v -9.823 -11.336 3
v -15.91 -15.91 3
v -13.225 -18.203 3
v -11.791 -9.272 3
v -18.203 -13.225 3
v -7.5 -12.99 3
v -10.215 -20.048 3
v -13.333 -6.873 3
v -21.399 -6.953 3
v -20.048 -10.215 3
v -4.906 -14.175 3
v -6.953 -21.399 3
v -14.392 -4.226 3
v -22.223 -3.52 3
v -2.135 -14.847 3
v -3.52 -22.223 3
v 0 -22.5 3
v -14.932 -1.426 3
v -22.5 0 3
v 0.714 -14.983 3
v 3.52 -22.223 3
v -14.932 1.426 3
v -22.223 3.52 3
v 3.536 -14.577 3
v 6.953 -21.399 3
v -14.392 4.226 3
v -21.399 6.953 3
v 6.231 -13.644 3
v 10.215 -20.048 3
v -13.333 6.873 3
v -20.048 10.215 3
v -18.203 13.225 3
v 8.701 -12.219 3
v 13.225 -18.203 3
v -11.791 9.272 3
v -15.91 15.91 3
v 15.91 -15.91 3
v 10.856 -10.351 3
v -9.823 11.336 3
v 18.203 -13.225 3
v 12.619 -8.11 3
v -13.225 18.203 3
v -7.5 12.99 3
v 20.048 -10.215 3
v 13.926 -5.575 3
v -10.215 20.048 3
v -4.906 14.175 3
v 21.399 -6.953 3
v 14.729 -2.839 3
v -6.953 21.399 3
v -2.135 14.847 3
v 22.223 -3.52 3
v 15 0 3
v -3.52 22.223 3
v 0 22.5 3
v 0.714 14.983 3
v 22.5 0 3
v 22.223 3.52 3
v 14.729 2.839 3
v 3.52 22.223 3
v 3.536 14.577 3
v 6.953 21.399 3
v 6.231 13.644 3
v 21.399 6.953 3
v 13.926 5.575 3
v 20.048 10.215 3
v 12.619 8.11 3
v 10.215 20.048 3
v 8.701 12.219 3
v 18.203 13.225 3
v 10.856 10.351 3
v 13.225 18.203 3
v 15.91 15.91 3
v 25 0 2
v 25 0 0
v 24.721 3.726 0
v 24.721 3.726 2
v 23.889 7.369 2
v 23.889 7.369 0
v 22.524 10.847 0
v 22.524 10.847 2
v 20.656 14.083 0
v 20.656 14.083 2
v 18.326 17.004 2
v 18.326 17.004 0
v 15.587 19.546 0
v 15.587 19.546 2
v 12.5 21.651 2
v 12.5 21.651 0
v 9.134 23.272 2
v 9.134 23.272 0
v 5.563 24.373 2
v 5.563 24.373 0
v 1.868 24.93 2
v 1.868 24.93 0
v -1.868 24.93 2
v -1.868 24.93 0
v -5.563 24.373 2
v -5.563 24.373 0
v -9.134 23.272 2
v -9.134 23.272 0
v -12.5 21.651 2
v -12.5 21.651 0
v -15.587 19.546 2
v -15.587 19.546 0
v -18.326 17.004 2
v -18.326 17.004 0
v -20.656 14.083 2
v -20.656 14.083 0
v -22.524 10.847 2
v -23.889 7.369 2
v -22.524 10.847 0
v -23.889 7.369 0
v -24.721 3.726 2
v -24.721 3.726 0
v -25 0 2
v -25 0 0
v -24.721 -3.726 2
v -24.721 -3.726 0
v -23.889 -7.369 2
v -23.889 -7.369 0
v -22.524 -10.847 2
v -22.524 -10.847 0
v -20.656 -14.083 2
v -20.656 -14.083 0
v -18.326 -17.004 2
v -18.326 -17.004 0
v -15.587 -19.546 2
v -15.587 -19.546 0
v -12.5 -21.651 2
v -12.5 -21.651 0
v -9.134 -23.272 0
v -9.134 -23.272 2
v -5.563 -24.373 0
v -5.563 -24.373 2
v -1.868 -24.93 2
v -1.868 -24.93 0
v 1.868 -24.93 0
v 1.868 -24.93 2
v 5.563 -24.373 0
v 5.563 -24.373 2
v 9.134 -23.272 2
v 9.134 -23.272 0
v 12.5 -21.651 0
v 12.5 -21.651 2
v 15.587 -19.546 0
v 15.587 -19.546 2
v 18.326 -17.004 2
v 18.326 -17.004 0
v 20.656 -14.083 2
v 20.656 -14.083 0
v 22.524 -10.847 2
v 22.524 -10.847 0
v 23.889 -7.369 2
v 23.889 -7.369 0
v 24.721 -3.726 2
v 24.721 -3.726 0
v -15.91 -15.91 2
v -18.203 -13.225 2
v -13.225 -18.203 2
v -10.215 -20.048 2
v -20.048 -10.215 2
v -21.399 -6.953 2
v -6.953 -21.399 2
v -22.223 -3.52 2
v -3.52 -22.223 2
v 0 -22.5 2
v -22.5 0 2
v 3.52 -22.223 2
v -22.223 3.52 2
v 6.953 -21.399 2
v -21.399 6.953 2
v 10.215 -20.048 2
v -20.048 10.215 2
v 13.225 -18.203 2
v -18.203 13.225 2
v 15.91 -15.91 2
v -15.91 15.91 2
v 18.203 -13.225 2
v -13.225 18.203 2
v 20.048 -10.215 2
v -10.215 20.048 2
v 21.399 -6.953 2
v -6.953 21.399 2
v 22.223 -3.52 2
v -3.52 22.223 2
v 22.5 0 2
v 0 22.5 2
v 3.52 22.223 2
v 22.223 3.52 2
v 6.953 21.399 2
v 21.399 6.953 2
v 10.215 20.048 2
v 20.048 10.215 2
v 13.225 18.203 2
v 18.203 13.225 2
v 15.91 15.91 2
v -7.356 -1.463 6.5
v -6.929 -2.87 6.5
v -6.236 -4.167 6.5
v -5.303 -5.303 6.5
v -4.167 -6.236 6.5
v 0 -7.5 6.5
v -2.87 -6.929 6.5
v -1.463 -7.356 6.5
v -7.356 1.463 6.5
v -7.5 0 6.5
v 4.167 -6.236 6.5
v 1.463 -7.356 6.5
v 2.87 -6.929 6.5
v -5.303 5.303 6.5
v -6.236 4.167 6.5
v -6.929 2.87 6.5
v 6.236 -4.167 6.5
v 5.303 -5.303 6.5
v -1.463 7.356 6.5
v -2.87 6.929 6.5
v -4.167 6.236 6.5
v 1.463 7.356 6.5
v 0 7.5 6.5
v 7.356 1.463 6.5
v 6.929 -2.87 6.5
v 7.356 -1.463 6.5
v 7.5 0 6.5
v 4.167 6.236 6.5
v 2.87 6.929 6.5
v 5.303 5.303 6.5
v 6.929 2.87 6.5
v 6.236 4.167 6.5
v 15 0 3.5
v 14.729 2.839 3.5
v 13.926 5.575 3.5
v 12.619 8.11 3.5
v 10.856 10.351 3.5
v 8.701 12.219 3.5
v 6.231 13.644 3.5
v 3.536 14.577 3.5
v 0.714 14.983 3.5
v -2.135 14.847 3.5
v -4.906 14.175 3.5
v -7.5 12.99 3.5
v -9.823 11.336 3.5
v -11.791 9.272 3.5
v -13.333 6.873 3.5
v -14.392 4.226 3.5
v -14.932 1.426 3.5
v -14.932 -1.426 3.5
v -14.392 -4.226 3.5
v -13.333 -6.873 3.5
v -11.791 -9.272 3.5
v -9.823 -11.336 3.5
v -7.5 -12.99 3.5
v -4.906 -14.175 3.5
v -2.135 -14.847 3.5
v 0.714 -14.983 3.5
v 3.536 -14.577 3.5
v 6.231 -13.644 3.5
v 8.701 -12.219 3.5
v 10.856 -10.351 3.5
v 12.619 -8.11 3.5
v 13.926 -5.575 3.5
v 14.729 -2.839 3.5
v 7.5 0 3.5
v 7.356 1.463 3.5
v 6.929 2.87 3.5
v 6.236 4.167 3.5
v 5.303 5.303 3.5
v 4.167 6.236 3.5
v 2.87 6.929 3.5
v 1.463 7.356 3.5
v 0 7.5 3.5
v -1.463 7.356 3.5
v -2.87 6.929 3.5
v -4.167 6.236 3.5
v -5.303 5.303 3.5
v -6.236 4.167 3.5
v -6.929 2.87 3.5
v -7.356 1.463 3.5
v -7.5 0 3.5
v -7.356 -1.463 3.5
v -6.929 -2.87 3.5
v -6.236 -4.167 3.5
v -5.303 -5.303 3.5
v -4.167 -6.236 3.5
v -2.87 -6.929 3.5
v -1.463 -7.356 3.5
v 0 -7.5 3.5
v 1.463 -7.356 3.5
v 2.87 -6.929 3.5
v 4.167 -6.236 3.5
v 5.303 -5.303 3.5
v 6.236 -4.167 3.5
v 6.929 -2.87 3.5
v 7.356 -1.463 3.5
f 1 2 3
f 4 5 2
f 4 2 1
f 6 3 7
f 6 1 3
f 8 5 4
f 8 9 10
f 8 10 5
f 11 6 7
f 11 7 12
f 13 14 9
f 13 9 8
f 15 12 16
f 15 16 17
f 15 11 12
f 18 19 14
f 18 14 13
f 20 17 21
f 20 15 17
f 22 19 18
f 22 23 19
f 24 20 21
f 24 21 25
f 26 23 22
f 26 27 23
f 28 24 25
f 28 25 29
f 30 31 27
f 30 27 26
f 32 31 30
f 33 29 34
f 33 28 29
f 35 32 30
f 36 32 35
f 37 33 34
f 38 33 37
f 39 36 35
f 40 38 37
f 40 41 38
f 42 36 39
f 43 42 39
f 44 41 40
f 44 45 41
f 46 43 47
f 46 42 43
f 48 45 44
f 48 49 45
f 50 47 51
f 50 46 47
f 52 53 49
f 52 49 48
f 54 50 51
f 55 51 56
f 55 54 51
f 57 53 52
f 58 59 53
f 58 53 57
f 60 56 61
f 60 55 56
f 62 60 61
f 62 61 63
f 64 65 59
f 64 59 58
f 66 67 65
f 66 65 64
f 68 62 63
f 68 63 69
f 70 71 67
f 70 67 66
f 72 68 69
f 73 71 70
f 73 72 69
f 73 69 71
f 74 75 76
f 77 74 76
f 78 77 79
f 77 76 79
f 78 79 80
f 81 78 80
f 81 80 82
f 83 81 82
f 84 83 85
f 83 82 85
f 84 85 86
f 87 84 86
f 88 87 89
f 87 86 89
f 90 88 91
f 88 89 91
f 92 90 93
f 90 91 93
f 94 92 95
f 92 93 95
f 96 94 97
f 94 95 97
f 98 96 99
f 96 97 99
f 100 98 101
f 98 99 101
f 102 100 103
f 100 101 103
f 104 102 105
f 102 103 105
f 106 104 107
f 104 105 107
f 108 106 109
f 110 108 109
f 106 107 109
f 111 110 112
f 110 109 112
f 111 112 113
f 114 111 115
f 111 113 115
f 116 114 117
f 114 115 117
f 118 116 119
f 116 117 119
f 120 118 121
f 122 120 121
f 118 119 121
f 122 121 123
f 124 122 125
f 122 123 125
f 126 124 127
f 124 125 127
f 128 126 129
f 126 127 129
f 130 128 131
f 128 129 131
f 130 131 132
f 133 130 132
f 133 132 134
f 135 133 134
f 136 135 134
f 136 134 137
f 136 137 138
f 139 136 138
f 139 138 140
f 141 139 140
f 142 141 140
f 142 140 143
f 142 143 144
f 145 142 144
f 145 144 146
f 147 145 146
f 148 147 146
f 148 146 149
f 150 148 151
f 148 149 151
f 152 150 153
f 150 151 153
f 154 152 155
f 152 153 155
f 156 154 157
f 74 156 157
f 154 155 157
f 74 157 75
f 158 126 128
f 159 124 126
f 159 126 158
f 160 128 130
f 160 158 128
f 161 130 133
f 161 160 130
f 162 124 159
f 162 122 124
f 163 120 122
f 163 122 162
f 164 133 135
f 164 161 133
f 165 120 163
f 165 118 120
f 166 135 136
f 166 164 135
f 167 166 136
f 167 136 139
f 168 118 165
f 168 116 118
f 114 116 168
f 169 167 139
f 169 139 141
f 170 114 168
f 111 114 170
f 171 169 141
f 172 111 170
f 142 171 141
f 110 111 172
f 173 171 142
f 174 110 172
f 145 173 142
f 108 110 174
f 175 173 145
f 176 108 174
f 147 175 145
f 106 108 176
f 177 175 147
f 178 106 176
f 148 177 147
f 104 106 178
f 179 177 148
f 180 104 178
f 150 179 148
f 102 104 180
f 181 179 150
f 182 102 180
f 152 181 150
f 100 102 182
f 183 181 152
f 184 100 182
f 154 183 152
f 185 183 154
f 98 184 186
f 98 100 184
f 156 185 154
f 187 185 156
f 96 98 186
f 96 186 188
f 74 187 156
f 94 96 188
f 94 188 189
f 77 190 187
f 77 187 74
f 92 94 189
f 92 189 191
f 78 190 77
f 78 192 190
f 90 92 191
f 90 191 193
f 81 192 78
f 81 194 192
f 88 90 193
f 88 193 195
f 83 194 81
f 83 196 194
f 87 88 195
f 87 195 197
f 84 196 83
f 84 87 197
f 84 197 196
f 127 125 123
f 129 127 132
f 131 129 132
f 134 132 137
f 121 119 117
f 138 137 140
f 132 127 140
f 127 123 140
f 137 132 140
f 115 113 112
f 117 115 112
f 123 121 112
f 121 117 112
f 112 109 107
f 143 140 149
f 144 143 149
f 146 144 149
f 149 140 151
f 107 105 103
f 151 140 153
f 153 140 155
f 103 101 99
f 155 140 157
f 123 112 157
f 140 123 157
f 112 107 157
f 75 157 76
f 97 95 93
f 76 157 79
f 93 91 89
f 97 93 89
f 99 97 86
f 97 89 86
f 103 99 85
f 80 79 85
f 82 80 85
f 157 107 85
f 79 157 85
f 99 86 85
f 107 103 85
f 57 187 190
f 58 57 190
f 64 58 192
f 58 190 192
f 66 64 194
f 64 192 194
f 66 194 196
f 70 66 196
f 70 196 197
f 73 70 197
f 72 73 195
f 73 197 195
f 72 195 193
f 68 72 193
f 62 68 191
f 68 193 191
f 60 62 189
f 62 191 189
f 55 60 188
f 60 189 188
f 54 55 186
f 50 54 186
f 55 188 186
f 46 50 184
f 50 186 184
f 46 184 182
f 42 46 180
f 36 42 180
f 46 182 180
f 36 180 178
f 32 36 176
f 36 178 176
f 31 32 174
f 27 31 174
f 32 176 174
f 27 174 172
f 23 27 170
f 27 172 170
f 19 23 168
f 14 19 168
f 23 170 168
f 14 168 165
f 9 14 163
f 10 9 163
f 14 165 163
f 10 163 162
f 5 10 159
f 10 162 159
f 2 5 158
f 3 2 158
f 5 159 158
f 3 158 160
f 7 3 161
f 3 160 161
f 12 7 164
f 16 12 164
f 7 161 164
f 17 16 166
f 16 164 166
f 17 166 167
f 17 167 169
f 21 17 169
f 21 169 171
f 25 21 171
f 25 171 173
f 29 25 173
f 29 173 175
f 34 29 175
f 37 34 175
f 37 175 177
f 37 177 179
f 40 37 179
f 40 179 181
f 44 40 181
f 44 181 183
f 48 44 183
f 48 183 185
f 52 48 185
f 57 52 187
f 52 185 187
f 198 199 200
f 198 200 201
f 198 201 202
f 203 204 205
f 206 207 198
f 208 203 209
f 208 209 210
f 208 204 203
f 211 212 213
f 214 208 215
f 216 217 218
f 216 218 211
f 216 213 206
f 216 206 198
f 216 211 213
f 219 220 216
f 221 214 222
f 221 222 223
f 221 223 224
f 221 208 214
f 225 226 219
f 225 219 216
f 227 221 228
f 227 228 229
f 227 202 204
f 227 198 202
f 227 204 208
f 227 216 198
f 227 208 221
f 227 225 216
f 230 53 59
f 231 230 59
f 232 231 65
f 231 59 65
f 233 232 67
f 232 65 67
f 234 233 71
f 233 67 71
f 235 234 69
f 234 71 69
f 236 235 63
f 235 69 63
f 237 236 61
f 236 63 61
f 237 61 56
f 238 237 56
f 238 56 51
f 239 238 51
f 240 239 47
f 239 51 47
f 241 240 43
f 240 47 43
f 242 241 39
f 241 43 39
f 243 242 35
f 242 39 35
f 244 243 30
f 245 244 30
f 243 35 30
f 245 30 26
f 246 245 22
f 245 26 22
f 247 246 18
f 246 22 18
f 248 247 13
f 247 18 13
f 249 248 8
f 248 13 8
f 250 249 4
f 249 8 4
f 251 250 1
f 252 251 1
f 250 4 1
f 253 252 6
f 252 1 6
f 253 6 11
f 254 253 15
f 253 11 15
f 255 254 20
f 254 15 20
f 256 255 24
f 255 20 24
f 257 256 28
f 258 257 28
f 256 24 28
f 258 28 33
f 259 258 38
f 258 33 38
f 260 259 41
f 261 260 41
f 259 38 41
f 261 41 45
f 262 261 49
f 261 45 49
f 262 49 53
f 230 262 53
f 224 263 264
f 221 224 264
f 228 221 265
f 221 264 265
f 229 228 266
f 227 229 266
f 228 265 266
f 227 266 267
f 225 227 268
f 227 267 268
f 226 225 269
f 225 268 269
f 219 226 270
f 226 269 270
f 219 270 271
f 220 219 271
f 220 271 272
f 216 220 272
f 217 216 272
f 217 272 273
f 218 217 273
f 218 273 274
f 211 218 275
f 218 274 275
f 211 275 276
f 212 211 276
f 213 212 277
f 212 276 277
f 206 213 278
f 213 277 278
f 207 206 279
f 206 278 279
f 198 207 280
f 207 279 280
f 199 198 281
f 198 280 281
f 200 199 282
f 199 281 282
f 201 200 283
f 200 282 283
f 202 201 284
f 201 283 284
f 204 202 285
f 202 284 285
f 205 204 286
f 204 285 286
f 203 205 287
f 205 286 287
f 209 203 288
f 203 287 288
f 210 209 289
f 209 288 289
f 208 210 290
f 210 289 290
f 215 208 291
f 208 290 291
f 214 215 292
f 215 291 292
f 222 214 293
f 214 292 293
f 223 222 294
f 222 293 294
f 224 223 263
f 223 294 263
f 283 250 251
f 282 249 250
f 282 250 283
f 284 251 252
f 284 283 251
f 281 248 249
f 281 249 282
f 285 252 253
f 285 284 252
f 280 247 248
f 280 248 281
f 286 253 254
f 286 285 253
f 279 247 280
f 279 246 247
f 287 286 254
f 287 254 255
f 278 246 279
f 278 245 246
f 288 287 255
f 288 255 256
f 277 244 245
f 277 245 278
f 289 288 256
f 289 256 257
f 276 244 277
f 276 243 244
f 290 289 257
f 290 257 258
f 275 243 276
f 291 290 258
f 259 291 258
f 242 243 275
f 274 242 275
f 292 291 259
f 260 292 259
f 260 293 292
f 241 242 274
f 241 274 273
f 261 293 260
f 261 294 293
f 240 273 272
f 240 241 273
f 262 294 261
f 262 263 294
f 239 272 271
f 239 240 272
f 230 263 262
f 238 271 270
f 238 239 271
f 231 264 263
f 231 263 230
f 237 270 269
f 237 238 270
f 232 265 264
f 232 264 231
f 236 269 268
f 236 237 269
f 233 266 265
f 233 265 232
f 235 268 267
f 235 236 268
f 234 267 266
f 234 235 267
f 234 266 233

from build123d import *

# Parameters (mm, degrees)
SKETCH1_R           = 25
SKETCH1_R_2         = 22.5
SKETCH1_R_3         = 15
SKETCH1_R_4         = 7.5
BOSS_EXTRUDE1_DEPTH = 2
BOSS_EXTRUDE2_START = 2
SKETCH1_3_R         = 22.5
SKETCH1_3_R_2       = 15
SKETCH1_3_R_3       = 7.5
BOSS_EXTRUDE2_DEPTH = 1
BOSS_EXTRUDE3_START = 3
SKETCH1_4_R         = 15
SKETCH1_4_R_2       = 7.5
BOSS_EXTRUDE3_DEPTH = 0.5
BOSS_EXTRUDE4_START = 3.5
SKETCH1_5_R         = 7.5
BOSS_EXTRUDE4_DEPTH = 3


with BuildPart() as part:
    # Sketch1 → Boss-Extrude1 (new body)
    # profile 1 of 4: a face of its own
    with BuildSketch(Plane.XY):
        Circle(SKETCH1_R)
        Circle(SKETCH1_R_2, mode=Mode.SUBTRACT)
    # profile 2 of 4: a face of its own
    with BuildSketch(Plane.XY):
        Circle(SKETCH1_R_2)
        Circle(SKETCH1_R_3, mode=Mode.SUBTRACT)
    # profile 3 of 4: a face of its own
    with BuildSketch(Plane.XY):
        Circle(SKETCH1_R_3)
        Circle(SKETCH1_R_4, mode=Mode.SUBTRACT)
    # profile 4 of 4: a face of its own
    with BuildSketch(Plane.XY):
        Circle(SKETCH1_R_4)
    extrude(amount=BOSS_EXTRUDE1_DEPTH)

    # Sketch1<3> → Boss-Extrude2 (add)
    # profile 1 of 3: a face of its own
    with BuildSketch(Plane.XY.offset(BOSS_EXTRUDE2_START)):
        Circle(SKETCH1_3_R)
        Circle(SKETCH1_3_R_2, mode=Mode.SUBTRACT)
    # profile 2 of 3: a face of its own
    with BuildSketch(Plane.XY.offset(BOSS_EXTRUDE2_START)):
        Circle(SKETCH1_3_R_2)
        Circle(SKETCH1_3_R_3, mode=Mode.SUBTRACT)
    # profile 3 of 3: a face of its own
    with BuildSketch(Plane.XY.offset(BOSS_EXTRUDE2_START)):
        Circle(SKETCH1_3_R_3)
    extrude(amount=BOSS_EXTRUDE2_DEPTH)

    # Sketch1<4> → Boss-Extrude3 (add)
    # profile 1 of 2: a face of its own
    with BuildSketch(Plane.XY.offset(BOSS_EXTRUDE3_START)):
        Circle(SKETCH1_4_R)
        Circle(SKETCH1_4_R_2, mode=Mode.SUBTRACT)
    # profile 2 of 2: a face of its own
    with BuildSketch(Plane.XY.offset(BOSS_EXTRUDE3_START)):
        Circle(SKETCH1_4_R_2)
    extrude(amount=BOSS_EXTRUDE3_DEPTH)

    # Sketch1<5> → Boss-Extrude4 (add)
    with BuildSketch(Plane.XY.offset(BOSS_EXTRUDE4_START)):
        Circle(SKETCH1_5_R)
    extrude(amount=BOSS_EXTRUDE4_DEPTH)


solid = part.part
